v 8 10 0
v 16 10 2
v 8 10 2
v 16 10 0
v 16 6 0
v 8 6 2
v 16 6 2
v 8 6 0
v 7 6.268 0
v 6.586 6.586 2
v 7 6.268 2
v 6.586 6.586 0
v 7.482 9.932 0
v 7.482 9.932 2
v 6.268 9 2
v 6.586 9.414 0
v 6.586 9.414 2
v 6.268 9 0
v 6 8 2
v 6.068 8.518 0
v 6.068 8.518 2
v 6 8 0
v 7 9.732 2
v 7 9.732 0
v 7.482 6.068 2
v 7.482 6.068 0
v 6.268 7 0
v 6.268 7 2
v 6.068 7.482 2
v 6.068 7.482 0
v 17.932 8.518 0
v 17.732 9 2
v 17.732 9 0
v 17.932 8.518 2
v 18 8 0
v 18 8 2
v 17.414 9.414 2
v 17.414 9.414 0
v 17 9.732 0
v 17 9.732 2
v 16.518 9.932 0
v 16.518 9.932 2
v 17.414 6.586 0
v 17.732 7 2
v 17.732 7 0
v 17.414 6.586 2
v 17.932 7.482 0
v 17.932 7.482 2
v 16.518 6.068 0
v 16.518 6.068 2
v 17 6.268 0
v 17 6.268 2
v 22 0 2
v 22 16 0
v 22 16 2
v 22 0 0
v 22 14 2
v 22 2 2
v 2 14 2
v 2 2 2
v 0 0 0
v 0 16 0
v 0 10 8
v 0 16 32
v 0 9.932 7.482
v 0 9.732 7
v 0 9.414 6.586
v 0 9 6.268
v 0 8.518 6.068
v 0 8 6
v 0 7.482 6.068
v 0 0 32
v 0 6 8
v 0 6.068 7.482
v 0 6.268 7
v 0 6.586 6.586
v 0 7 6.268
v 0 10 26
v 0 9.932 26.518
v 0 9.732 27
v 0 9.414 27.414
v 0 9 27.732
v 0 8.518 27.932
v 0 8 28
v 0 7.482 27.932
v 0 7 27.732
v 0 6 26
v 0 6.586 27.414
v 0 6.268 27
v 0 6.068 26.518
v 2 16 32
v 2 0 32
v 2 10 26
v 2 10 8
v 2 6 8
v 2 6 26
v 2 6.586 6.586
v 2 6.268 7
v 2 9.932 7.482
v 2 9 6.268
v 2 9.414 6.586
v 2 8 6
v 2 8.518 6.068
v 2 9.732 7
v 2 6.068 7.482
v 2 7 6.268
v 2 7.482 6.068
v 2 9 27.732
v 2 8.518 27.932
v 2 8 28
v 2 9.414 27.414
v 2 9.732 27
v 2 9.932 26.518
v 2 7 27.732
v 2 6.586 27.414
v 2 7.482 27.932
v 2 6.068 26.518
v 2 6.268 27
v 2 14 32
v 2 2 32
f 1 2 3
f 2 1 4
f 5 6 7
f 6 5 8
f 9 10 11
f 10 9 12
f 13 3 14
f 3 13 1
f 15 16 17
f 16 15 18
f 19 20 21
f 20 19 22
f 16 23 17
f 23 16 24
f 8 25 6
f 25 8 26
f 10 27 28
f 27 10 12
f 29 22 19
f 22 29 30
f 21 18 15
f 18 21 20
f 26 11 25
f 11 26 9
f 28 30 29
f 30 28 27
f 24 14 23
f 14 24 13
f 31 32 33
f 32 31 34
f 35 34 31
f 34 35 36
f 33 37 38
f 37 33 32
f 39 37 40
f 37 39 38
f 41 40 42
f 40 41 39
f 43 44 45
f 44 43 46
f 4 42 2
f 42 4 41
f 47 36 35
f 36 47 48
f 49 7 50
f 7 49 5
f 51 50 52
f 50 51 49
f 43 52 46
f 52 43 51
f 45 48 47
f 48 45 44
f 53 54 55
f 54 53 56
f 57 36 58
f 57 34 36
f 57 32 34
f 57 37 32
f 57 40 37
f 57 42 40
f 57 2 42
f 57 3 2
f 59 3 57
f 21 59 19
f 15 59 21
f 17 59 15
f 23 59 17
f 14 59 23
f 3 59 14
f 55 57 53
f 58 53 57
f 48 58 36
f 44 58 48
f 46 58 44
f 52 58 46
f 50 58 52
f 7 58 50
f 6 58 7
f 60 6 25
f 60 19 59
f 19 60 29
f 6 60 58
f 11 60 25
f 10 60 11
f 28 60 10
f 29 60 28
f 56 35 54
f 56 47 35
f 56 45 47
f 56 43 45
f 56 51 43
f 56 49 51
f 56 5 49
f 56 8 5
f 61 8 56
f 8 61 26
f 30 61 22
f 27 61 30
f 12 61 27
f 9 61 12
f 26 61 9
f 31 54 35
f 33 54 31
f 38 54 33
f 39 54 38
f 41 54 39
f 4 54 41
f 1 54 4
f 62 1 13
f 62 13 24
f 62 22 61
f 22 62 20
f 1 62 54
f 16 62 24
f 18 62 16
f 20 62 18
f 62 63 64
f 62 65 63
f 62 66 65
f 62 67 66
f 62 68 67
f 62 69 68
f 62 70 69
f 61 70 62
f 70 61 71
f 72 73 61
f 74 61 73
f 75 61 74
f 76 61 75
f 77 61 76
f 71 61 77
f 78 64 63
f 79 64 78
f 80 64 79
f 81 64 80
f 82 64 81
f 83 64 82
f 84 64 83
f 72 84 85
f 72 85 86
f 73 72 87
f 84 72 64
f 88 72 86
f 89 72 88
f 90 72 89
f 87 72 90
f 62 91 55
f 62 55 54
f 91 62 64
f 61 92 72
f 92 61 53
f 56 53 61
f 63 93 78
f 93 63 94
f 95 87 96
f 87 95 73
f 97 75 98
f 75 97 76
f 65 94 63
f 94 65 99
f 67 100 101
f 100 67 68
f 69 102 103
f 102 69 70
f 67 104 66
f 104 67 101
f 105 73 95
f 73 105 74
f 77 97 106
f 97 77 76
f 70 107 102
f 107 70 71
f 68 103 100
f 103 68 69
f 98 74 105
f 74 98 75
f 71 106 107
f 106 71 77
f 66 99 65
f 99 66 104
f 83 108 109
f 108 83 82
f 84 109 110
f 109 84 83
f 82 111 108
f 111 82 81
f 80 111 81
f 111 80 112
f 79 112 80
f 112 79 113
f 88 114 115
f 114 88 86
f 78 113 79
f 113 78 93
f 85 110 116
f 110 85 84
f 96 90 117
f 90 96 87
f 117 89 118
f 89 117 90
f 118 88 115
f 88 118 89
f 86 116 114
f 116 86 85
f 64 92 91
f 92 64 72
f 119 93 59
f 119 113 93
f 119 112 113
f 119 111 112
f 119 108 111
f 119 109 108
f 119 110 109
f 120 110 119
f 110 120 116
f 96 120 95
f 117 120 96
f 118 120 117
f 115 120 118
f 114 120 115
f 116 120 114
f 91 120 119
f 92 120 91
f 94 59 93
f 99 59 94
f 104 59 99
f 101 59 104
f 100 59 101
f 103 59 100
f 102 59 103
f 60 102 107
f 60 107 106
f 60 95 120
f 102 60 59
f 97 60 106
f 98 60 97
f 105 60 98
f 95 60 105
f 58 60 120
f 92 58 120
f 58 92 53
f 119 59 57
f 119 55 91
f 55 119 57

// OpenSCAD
//=============================================================================
// l-bracket.scad
//
// generates an l-bracket from the given parameters
//=============================================================================
// CHANGELOG
//
// v1.1 - makes side lengths independant, set $fn
// v1.0 - original release
//=============================================================================
// Written in 2018 by Patrick Barrett
//
// To the extent possible under law, the author(s) have dedicated all copyright
// and related and neighboring rights to this work to the public domain
// worldwide. This work is distributed without any warranty.
//
// See <http://creativecommons.org/publicdomain/zero/1.0/> for full dedication.
//=============================================================================

wall_thickness = 2;
internal_width = 12;
slot_width = 4;
side_length_v = 30;
side_length_h = 20;

// customizable variables end here

head_annulus = (internal_width/2) - (slot_width/2);

abit = 0.0001 * 1; //use for making overlap to get single manifold stl

$fn = 24;

module stadium3d(a, r, z, center = false){
	offset_x = center ? -(r + (a / 2)) : 0;
	offset_y = center ? -(r) : 0;
	offset_z = center ? -(z / 2) : 0;

	translate([offset_x, offset_y, offset_z])
	union() {
		translate([r, 0, 0])
			cube([a, 2*r, z]);
		translate([r, r, 0])
			cylinder(h = z, r = r, center = false);
		translate([r + a, r, 0])
			cylinder(h = z, r = r);
	}
}

union() {
	// horizontal wall
	difference() {
		cube([side_length_h + wall_thickness,
		      internal_width + 2*wall_thickness,
		      wall_thickness]);
		translate([wall_thickness + head_annulus,
		           wall_thickness + head_annulus,
		           -1])
			stadium3d(side_length_h - (2*head_annulus) - slot_width,
 			          slot_width / 2,
 			          wall_thickness + 2);
	}

	// vertiacle wall
	translate([wall_thickness, 0, 0])
	rotate([0,-90,0])
	difference() {
		cube([side_length_v + wall_thickness,
		      internal_width + 2*wall_thickness,
		      wall_thickness]);
		translate([wall_thickness + head_annulus,
		           wall_thickness + head_annulus,
		           -1])
			stadium3d(side_length_v - (2*head_annulus) - slot_width,
 			          slot_width / 2,
 			          wall_thickness + 2);
	}

	// bracer 1
	translate([wall_thickness - abit,
	           wall_thickness,
	           wall_thickness - abit])
	rotate([90,0,0])
	linear_extrude(height = wall_thickness) {
		polygon([[0,0],
		        [side_length_h,0],
		        [0,side_length_v]]);
	}

	// bracer 2
	translate([wall_thickness - abit,
	           2*wall_thickness + internal_width,
	           wall_thickness - abit])
	rotate([90,0,0])
	linear_extrude(height = wall_thickness) {
		polygon([[0,0],
		        [side_length_h,0],
		        [0,side_length_v]]);
	}
}
